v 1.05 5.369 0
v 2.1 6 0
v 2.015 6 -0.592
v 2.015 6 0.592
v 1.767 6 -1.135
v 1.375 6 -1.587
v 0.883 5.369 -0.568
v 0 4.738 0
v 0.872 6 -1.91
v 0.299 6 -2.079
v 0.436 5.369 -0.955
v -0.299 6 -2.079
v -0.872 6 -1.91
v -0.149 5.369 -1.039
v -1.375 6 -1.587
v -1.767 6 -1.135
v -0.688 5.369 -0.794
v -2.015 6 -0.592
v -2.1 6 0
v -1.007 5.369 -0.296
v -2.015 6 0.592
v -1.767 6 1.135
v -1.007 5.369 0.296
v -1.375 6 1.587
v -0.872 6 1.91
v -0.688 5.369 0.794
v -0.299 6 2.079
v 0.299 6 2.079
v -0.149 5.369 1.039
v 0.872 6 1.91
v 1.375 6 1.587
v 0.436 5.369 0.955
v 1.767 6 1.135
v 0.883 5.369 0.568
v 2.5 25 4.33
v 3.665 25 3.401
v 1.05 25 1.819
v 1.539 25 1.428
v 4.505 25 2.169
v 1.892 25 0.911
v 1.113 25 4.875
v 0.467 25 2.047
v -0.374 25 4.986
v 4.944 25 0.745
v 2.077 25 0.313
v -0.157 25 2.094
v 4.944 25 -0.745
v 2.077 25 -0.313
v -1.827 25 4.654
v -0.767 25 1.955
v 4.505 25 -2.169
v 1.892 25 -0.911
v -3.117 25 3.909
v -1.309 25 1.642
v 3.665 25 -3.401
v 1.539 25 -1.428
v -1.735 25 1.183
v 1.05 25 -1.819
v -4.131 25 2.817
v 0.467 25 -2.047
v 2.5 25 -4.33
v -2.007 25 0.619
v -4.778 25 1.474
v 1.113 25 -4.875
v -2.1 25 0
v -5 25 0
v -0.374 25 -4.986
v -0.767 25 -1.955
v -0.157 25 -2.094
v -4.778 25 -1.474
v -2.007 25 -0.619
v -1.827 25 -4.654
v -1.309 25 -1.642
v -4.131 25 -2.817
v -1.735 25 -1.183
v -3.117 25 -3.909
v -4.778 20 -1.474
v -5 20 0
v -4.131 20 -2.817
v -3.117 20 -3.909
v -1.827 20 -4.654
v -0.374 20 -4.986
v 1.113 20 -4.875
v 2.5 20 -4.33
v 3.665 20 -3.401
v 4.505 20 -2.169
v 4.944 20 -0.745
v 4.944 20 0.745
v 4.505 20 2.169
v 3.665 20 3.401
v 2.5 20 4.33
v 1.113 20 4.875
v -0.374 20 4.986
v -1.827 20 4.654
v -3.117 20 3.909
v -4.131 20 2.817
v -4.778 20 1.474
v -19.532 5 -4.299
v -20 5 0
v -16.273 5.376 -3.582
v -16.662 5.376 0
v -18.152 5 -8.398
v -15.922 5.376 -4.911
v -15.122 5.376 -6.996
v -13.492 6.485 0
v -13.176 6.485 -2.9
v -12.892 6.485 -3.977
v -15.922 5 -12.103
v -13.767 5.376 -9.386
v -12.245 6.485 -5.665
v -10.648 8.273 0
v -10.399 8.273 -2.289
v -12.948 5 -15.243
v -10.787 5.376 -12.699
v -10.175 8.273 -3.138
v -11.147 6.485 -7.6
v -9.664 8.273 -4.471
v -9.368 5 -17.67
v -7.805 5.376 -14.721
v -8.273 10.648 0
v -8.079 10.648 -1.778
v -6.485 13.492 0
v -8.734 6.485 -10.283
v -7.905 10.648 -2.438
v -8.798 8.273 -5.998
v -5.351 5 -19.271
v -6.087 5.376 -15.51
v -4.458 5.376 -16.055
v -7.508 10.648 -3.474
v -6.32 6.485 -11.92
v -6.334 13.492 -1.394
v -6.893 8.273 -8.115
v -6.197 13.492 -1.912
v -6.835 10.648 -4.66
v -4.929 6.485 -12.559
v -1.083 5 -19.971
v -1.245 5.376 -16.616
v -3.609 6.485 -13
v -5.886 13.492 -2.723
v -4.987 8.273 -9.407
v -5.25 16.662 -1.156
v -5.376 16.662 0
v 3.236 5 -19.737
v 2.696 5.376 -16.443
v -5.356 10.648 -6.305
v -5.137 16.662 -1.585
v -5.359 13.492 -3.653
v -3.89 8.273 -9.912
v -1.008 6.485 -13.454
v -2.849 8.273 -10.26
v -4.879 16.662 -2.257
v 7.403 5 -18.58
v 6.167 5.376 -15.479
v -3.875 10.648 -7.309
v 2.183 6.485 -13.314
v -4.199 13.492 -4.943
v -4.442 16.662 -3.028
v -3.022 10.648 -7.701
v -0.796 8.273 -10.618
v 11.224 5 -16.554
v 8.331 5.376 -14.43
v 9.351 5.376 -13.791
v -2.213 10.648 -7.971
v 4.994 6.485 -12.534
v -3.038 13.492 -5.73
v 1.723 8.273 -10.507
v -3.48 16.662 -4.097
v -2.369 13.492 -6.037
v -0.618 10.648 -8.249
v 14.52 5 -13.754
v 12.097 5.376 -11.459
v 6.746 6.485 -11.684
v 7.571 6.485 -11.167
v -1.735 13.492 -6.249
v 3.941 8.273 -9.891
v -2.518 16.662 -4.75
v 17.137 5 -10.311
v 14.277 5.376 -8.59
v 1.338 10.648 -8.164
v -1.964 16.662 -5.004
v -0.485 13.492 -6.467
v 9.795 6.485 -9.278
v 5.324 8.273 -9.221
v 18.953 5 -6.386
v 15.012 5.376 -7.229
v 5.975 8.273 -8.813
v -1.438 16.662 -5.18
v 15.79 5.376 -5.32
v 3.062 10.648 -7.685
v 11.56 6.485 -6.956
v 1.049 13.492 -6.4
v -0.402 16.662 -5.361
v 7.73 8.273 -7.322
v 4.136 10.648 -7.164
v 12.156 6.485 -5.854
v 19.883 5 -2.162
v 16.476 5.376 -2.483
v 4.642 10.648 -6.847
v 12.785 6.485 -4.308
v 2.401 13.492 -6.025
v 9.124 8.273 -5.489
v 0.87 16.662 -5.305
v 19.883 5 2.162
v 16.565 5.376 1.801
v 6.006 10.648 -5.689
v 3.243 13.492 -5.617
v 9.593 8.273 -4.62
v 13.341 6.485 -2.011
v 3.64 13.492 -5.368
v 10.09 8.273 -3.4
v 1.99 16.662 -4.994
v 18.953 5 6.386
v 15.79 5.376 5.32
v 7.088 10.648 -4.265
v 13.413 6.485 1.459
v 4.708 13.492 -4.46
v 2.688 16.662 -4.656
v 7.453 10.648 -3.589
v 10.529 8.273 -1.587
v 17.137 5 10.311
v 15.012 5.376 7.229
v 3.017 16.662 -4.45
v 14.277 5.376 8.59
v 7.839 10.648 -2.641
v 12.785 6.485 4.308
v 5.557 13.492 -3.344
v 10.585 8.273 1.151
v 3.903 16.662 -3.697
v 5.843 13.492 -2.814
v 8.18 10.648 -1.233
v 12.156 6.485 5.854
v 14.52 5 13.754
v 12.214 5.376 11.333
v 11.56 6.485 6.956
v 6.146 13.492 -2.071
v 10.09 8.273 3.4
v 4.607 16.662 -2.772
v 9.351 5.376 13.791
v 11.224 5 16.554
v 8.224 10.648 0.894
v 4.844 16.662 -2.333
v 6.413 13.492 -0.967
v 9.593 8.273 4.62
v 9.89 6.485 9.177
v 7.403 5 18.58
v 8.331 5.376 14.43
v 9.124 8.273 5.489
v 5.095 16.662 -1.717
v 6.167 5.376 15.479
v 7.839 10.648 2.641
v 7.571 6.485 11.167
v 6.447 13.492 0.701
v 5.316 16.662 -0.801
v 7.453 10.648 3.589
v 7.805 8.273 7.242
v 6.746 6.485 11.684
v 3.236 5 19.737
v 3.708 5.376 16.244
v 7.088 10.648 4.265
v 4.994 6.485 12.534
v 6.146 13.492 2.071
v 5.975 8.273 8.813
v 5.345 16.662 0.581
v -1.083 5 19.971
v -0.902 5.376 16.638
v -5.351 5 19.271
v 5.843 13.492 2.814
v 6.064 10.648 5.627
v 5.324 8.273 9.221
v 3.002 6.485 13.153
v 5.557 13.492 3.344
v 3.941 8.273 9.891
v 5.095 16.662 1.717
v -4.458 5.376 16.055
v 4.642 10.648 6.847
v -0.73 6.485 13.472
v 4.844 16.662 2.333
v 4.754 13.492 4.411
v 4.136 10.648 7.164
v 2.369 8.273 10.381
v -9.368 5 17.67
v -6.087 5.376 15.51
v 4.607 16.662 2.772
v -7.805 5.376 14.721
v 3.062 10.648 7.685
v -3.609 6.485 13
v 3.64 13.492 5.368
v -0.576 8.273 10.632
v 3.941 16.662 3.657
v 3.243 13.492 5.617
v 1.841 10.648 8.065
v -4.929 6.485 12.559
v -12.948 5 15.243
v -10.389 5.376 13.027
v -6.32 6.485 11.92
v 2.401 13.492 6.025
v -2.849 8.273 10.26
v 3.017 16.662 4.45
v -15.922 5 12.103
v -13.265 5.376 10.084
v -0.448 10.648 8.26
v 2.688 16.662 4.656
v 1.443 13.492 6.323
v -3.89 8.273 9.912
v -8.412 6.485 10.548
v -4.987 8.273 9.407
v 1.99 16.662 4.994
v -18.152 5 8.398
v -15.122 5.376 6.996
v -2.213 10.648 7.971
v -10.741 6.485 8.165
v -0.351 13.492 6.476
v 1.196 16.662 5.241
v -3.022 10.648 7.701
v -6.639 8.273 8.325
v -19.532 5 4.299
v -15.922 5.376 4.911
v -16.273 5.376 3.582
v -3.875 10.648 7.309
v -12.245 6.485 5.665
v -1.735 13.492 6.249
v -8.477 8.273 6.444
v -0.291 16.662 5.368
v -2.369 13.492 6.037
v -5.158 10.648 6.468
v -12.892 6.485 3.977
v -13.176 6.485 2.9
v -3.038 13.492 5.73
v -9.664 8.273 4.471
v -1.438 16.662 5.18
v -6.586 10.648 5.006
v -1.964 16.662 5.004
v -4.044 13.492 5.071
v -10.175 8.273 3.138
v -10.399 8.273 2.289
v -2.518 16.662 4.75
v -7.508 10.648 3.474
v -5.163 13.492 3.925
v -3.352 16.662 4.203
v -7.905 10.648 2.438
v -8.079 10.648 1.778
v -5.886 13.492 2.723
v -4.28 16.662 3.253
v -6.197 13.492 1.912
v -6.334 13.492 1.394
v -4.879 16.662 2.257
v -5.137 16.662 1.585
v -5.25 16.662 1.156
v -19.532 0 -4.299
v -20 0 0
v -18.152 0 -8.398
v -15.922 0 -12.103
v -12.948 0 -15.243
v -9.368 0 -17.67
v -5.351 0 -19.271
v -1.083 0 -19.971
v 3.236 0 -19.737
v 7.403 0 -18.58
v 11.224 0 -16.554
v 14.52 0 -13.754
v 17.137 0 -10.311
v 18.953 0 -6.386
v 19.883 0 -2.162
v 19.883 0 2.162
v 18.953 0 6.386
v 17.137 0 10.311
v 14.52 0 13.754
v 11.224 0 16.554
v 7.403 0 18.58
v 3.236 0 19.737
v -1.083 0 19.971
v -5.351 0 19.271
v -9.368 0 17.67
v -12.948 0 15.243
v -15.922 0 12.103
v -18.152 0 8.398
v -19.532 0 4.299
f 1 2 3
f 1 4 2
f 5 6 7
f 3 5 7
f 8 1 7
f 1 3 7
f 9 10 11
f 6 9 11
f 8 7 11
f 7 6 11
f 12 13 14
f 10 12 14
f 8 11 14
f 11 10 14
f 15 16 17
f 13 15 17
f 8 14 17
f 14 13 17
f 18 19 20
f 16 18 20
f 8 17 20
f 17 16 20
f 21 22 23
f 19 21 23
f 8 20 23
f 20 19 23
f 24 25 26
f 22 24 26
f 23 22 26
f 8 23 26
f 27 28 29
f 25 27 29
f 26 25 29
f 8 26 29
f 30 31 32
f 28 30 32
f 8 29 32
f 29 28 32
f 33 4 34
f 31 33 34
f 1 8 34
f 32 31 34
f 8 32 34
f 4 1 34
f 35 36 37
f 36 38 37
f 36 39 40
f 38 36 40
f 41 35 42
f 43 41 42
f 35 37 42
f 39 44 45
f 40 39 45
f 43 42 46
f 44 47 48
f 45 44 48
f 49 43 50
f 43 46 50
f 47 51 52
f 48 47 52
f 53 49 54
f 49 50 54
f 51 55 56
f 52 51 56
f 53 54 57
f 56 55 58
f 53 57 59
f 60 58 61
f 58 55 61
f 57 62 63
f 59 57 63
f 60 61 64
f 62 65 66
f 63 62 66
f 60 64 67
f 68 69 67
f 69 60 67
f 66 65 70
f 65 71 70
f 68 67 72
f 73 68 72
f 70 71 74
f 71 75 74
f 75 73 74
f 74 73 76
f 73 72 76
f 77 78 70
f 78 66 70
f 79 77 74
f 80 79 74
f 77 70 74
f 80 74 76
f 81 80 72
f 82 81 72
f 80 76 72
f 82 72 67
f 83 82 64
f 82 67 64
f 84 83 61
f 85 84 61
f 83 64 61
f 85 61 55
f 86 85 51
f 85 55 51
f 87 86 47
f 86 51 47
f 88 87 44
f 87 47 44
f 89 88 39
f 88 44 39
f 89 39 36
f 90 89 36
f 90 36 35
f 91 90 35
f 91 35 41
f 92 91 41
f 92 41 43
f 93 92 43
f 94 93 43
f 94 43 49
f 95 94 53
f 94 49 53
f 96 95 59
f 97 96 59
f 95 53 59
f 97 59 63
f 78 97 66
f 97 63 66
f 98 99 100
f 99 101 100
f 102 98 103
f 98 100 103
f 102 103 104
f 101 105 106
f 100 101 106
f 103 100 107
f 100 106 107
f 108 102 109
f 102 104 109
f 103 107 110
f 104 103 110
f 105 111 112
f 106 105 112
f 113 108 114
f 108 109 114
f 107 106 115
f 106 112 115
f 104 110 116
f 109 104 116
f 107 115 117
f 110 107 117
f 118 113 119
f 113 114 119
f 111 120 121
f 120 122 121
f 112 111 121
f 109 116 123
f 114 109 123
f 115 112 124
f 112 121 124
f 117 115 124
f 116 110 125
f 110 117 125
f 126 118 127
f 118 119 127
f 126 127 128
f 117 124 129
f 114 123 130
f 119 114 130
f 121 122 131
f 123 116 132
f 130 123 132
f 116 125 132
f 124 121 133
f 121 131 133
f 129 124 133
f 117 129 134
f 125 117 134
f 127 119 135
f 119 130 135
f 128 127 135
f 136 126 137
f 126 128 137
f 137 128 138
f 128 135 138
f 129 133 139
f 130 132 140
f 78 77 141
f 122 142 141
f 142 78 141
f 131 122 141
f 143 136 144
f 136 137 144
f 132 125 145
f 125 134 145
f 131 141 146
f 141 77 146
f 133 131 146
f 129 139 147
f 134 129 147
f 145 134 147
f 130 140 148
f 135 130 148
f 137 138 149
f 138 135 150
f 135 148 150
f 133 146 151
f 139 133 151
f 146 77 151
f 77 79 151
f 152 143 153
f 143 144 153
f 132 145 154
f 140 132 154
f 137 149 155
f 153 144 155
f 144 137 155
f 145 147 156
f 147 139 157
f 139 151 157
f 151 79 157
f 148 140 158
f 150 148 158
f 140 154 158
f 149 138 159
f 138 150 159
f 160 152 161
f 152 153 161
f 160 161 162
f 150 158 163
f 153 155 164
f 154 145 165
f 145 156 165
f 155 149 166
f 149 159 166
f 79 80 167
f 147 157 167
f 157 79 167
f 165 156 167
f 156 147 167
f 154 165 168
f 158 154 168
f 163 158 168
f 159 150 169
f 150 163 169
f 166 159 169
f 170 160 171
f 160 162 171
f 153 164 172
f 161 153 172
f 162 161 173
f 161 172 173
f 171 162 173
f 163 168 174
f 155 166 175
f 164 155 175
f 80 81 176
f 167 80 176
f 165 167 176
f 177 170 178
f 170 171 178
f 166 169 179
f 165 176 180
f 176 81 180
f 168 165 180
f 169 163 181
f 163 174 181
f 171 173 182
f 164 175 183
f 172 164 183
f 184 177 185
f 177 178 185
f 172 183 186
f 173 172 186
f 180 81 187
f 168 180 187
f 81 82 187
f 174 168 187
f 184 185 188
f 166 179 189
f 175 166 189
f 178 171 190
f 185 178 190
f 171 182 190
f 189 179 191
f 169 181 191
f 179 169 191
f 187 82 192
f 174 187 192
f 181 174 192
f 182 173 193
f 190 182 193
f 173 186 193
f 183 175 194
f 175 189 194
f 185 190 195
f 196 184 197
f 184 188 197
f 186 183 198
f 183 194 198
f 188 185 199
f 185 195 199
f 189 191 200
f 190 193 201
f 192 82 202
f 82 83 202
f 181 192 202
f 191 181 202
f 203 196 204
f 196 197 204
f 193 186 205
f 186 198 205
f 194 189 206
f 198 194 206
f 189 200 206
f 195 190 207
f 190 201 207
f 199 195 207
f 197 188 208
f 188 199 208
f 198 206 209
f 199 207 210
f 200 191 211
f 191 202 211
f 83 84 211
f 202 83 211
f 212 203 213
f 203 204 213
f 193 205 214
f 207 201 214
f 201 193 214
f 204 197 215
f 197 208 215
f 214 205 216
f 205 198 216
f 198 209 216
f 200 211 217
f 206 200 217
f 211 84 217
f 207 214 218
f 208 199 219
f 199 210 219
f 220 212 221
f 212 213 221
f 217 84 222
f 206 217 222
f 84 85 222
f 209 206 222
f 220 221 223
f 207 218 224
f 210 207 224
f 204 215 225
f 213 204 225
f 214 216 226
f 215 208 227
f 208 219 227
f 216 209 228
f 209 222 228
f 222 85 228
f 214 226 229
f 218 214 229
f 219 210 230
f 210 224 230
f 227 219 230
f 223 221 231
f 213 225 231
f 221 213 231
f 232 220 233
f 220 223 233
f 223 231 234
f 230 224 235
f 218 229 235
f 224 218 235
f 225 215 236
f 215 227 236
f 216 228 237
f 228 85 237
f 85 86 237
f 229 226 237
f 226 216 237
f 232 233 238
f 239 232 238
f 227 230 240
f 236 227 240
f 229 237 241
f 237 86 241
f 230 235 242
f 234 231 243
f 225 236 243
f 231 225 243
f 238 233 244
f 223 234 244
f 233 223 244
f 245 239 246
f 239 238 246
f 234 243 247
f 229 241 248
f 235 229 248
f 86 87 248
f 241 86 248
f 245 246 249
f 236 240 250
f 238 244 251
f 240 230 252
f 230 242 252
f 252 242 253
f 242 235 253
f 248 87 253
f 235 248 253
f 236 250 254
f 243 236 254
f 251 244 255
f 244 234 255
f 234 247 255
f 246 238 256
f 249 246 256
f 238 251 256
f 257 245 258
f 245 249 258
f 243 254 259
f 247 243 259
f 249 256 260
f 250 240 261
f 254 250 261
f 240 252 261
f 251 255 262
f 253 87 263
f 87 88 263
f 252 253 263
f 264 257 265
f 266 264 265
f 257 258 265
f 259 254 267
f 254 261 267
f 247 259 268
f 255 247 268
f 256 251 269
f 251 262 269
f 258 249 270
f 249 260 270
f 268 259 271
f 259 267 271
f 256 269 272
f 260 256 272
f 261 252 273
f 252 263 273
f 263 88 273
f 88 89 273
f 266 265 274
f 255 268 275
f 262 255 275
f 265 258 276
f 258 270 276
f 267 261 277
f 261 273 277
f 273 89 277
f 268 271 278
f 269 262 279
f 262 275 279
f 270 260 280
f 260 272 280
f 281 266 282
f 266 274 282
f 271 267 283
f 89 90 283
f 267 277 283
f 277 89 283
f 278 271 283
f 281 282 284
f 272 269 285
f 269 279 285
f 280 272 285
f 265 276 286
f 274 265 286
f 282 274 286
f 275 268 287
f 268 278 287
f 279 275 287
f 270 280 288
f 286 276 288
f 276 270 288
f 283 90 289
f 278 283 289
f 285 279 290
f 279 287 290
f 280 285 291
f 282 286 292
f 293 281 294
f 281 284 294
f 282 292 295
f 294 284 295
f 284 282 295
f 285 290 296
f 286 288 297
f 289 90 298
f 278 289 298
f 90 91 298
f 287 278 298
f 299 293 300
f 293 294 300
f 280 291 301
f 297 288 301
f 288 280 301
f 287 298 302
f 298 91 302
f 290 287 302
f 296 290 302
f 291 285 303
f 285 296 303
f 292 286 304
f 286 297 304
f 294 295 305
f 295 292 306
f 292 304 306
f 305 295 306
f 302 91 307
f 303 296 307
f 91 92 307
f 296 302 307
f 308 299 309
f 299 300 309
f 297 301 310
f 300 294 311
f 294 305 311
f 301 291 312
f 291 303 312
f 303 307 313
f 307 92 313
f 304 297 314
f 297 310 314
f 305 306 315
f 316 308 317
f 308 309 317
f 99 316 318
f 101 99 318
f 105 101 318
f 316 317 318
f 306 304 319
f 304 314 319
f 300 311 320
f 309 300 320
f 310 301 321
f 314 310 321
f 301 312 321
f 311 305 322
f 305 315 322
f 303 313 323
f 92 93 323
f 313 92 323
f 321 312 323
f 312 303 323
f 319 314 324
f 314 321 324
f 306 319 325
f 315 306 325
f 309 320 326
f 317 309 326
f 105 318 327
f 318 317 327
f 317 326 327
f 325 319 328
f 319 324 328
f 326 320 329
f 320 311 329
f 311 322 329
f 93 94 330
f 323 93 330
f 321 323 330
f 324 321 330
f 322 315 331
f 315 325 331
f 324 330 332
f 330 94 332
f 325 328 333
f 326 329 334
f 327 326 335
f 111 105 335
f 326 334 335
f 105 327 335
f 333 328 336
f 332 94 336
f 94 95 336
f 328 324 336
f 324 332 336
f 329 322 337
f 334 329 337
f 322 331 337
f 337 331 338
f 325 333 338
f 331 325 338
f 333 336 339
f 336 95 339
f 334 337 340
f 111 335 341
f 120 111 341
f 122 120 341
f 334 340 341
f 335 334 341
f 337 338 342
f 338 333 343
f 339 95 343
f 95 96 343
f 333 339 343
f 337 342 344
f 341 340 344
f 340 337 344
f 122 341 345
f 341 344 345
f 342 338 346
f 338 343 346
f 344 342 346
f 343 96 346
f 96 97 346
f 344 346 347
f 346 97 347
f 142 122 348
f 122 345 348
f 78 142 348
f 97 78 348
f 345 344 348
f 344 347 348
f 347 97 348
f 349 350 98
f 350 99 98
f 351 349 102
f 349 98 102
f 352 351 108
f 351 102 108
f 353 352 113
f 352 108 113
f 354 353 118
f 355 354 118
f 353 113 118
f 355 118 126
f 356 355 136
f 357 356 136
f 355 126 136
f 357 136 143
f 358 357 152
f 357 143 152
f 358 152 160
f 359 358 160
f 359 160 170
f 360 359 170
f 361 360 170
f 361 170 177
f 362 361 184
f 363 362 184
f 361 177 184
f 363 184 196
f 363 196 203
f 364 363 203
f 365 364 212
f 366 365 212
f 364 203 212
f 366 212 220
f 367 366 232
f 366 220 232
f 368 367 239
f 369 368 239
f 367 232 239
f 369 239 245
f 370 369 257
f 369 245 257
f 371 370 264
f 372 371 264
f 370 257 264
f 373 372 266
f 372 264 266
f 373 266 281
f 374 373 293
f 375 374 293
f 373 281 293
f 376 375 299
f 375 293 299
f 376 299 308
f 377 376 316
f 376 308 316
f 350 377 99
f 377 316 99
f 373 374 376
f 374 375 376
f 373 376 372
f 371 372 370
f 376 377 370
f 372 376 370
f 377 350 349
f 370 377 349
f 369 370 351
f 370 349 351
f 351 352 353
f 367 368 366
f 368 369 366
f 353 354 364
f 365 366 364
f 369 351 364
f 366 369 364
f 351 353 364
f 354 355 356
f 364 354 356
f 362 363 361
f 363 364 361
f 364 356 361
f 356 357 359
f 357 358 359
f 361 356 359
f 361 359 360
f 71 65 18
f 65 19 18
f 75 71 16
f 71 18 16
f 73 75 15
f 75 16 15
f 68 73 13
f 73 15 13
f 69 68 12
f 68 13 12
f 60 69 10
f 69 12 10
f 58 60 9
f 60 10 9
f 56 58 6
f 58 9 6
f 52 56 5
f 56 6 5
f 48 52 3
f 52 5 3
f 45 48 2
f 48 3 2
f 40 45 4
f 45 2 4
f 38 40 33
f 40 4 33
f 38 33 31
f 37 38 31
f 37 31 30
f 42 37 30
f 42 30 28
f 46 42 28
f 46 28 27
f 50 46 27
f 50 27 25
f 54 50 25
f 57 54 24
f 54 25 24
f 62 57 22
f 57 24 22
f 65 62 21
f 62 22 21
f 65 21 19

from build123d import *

# Parameters (mm, degrees)
M5X0_8_TAPPED_HOLE1_D     = 4.2
M5X0_8_TAPPED_HOLE1_DEPTH = 19
M5X0_8_TAPPED_HOLE1_TIP   = 1.2618073


with BuildPart() as part:
    # Sketch2 → Revolve1 (revolve)
    with BuildSketch(Plane.XY):
        with BuildLine():
            Line((0, 0), (-20, 0))
            Line((-20, 0), (-20, 5))
            ThreePointArc((-20, 5), (-9.393398282, 9.393398282), (-5, 20))
            Line((-5, 20), (-5, 25))
            Line((-5, 25), (0, 25))
            Line((0, 25), (0, 0))
        make_face()
    revolve(axis=Axis((0, 25, 0), (0, -1, 0)))

    # M5x0.8 Tapped Hole1
    with Locations(Plane(origin=(0, 25, 0), x_dir=(1, 0, 0), z_dir=(0, 1, 0))):
        with Locations((0, 0)):
            Hole(M5X0_8_TAPPED_HOLE1_D / 2, depth=M5X0_8_TAPPED_HOLE1_DEPTH)
            with Locations((0, 0, -(M5X0_8_TAPPED_HOLE1_DEPTH + M5X0_8_TAPPED_HOLE1_TIP / 2))):  # 118° drill point
                Cone(0, M5X0_8_TAPPED_HOLE1_D / 2, M5X0_8_TAPPED_HOLE1_TIP, mode=Mode.SUBTRACT)


solid = part.part
